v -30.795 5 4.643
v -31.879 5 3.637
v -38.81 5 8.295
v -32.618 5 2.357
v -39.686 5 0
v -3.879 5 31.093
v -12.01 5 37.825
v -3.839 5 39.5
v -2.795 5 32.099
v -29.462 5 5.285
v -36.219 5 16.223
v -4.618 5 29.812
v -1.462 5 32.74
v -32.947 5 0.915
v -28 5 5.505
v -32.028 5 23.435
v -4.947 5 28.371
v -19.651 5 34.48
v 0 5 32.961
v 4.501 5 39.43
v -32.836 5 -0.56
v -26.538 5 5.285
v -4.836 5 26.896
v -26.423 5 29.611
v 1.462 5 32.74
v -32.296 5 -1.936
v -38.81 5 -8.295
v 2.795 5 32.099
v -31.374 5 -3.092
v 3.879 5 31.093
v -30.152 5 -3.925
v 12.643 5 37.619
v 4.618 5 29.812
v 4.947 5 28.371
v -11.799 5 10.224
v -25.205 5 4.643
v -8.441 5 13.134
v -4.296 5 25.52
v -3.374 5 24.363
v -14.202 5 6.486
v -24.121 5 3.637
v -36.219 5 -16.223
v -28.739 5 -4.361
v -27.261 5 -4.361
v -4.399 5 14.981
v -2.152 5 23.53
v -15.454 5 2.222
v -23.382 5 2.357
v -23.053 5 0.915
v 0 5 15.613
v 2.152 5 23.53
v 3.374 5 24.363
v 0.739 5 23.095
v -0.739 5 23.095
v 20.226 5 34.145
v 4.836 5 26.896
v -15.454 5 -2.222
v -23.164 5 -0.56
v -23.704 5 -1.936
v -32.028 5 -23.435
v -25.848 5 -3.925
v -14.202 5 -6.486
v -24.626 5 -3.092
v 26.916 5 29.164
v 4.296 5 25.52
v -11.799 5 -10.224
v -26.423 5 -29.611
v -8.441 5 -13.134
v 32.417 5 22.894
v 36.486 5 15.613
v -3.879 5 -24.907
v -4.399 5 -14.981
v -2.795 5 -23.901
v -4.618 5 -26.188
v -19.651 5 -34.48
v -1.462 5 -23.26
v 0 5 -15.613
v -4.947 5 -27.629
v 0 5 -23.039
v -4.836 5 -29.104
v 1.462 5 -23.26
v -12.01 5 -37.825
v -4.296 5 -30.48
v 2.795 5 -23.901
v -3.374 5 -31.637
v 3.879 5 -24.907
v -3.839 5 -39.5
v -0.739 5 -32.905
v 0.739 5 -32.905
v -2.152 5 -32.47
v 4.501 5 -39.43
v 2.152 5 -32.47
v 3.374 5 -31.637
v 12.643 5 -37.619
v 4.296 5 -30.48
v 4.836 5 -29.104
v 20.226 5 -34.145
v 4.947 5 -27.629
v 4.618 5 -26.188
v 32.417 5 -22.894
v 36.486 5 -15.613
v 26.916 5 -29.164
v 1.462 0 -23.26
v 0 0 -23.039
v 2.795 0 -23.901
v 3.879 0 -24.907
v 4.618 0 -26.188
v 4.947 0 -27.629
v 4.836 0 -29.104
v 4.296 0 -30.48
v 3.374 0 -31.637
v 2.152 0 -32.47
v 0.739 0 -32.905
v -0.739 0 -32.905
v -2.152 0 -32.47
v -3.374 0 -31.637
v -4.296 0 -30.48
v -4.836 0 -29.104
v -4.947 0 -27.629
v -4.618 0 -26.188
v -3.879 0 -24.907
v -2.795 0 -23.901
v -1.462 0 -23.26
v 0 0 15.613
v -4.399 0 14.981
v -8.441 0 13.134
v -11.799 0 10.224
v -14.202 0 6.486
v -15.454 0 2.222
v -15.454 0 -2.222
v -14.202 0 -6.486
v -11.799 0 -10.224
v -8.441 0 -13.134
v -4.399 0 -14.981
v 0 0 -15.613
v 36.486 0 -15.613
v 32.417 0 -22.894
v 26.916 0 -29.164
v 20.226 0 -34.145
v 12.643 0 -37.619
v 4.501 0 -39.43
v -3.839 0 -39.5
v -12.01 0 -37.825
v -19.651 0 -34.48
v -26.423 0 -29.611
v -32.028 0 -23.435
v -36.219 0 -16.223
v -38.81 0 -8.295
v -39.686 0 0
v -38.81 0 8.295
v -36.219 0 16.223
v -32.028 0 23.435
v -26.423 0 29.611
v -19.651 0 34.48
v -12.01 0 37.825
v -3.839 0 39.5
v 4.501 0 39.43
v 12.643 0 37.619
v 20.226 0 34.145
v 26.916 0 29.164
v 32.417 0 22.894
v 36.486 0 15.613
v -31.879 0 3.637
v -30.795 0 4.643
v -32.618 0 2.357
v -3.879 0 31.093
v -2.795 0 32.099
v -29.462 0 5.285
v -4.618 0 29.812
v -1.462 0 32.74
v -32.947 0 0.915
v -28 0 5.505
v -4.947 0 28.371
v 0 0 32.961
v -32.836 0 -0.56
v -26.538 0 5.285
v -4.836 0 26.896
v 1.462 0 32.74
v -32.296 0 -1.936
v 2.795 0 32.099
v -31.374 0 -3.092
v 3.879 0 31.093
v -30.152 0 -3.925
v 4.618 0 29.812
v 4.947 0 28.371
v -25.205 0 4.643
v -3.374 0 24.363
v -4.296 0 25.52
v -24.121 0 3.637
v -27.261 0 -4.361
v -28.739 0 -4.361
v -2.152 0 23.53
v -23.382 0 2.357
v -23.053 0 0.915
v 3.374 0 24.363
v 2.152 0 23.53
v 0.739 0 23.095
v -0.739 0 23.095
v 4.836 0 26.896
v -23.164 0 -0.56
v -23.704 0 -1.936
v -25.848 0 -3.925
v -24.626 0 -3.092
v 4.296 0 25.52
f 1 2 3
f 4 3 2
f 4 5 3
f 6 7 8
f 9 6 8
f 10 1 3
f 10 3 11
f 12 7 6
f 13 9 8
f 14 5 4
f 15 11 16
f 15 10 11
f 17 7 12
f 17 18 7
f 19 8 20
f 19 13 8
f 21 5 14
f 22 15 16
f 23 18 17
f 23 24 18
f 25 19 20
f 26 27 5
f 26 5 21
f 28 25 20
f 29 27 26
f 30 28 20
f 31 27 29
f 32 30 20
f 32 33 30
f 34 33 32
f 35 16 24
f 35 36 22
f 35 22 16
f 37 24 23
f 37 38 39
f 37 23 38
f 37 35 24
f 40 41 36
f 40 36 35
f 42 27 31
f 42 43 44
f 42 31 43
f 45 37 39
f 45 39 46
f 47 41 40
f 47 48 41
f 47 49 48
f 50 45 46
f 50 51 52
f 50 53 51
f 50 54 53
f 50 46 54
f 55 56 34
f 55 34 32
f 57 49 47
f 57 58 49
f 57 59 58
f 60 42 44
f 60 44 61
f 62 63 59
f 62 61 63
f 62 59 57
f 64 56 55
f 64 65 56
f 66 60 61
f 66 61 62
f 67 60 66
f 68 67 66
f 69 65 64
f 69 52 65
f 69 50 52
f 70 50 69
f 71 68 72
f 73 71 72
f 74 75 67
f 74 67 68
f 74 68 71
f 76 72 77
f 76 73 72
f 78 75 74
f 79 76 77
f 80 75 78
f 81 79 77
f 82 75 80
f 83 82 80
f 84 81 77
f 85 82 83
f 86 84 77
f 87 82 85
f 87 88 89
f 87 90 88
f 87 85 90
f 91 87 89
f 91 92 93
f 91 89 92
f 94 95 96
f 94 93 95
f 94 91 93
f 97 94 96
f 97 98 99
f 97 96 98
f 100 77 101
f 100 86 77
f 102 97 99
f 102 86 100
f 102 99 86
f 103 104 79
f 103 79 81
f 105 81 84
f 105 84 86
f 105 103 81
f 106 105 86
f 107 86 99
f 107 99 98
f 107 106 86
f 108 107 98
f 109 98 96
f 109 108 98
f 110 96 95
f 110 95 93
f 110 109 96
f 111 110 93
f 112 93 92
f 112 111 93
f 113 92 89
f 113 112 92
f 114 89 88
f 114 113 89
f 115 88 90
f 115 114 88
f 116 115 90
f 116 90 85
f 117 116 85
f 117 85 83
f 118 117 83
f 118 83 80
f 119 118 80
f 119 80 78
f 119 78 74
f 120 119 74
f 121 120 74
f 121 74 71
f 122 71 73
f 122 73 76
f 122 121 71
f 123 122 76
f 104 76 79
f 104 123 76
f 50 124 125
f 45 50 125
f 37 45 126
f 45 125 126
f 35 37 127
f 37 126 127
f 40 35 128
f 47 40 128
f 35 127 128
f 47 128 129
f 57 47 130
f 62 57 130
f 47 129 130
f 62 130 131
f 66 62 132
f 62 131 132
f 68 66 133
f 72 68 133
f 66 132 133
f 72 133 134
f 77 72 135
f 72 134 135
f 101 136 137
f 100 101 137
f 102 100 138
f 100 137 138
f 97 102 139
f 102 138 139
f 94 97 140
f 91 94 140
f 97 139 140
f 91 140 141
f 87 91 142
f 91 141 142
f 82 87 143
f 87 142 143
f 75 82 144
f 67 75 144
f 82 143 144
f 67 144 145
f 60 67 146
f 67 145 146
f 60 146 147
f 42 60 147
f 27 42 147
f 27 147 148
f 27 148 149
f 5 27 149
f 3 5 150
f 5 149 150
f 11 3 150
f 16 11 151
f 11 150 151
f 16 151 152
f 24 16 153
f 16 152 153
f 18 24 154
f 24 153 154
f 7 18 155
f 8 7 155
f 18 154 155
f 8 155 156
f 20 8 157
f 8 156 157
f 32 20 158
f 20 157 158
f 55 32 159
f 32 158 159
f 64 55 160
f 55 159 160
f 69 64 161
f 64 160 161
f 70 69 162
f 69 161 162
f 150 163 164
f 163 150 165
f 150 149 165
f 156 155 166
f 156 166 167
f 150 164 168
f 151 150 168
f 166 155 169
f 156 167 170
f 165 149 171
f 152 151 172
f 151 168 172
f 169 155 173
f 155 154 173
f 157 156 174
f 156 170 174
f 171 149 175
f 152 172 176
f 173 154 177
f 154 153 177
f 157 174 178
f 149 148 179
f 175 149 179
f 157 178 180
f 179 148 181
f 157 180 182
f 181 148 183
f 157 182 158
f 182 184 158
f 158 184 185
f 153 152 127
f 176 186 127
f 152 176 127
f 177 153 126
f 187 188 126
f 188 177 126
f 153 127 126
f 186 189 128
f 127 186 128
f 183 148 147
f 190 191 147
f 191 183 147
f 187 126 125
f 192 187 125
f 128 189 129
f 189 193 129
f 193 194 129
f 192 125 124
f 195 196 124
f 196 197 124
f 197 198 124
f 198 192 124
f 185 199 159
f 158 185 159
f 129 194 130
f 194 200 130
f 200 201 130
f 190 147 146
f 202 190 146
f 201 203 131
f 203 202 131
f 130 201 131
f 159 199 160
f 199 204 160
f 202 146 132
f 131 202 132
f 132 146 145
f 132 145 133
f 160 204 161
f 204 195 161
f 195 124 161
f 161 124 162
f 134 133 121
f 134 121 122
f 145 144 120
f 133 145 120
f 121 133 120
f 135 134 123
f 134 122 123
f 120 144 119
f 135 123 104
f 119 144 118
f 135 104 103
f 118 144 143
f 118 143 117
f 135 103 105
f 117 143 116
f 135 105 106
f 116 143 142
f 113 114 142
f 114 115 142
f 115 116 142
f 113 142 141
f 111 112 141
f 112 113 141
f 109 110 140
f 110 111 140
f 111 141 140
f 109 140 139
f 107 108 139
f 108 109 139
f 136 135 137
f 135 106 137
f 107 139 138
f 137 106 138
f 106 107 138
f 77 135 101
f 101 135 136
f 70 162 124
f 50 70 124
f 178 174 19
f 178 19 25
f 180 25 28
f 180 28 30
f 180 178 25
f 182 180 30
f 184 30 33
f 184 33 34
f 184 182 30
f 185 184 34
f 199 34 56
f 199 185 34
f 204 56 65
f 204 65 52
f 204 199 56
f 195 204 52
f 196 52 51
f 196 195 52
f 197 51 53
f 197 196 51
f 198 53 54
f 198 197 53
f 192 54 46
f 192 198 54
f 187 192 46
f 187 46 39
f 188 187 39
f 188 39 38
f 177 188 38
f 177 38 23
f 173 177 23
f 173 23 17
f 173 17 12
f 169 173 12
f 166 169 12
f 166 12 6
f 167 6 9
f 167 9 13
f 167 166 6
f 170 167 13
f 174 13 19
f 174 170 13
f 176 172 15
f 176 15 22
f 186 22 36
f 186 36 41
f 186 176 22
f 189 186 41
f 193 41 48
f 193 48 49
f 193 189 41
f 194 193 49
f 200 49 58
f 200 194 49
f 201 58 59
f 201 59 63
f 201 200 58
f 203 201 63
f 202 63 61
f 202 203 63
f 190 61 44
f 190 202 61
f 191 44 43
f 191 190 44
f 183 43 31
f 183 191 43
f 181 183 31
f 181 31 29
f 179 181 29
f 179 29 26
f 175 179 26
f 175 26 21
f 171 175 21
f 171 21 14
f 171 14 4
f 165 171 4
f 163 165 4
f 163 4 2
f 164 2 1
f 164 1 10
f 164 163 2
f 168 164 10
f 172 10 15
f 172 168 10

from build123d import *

# Parameters (mm, degrees)
IZIM1_R                     = 4.960788644
Y_KSEKLIK_EKSTR_ZYON1_DEPTH = 5


with BuildPart() as part:
    # Çizim1 → Yükseklik-Ekstrüzyon1 (new body)
    with BuildSketch(Plane(origin=(0, 0, 0), x_dir=(1, 0, 0), z_dir=(0, 1, 0))):
        with BuildLine():
            ThreePointArc((0, -15.612956291), (-15.612956291, 0), (0, 15.612956291))
            Line((0, 15.612956291), (36.486144355, 15.612956291))
            ThreePointArc((36.486144355, 15.612956291), (-39.686309151, 0), (36.486144355, -15.612956291))
            Line((36.486144355, -15.612956291), (0, -15.612956291))
        make_face()
        with Locations(Location((-28, -0.544306251, 0), (0, 0, 270))):
            Circle(IZIM1_R, mode=Mode.SUBTRACT)
        with Locations(Location((0, -28, 0), (0, 0, 270))):
            Circle(IZIM1_R, mode=Mode.SUBTRACT)
        with Locations(Location((0, 28, 0), (0, 0, 270))):
            Circle(IZIM1_R, mode=Mode.SUBTRACT)
    extrude(amount=Y_KSEKLIK_EKSTR_ZYON1_DEPTH)


solid = part.part
